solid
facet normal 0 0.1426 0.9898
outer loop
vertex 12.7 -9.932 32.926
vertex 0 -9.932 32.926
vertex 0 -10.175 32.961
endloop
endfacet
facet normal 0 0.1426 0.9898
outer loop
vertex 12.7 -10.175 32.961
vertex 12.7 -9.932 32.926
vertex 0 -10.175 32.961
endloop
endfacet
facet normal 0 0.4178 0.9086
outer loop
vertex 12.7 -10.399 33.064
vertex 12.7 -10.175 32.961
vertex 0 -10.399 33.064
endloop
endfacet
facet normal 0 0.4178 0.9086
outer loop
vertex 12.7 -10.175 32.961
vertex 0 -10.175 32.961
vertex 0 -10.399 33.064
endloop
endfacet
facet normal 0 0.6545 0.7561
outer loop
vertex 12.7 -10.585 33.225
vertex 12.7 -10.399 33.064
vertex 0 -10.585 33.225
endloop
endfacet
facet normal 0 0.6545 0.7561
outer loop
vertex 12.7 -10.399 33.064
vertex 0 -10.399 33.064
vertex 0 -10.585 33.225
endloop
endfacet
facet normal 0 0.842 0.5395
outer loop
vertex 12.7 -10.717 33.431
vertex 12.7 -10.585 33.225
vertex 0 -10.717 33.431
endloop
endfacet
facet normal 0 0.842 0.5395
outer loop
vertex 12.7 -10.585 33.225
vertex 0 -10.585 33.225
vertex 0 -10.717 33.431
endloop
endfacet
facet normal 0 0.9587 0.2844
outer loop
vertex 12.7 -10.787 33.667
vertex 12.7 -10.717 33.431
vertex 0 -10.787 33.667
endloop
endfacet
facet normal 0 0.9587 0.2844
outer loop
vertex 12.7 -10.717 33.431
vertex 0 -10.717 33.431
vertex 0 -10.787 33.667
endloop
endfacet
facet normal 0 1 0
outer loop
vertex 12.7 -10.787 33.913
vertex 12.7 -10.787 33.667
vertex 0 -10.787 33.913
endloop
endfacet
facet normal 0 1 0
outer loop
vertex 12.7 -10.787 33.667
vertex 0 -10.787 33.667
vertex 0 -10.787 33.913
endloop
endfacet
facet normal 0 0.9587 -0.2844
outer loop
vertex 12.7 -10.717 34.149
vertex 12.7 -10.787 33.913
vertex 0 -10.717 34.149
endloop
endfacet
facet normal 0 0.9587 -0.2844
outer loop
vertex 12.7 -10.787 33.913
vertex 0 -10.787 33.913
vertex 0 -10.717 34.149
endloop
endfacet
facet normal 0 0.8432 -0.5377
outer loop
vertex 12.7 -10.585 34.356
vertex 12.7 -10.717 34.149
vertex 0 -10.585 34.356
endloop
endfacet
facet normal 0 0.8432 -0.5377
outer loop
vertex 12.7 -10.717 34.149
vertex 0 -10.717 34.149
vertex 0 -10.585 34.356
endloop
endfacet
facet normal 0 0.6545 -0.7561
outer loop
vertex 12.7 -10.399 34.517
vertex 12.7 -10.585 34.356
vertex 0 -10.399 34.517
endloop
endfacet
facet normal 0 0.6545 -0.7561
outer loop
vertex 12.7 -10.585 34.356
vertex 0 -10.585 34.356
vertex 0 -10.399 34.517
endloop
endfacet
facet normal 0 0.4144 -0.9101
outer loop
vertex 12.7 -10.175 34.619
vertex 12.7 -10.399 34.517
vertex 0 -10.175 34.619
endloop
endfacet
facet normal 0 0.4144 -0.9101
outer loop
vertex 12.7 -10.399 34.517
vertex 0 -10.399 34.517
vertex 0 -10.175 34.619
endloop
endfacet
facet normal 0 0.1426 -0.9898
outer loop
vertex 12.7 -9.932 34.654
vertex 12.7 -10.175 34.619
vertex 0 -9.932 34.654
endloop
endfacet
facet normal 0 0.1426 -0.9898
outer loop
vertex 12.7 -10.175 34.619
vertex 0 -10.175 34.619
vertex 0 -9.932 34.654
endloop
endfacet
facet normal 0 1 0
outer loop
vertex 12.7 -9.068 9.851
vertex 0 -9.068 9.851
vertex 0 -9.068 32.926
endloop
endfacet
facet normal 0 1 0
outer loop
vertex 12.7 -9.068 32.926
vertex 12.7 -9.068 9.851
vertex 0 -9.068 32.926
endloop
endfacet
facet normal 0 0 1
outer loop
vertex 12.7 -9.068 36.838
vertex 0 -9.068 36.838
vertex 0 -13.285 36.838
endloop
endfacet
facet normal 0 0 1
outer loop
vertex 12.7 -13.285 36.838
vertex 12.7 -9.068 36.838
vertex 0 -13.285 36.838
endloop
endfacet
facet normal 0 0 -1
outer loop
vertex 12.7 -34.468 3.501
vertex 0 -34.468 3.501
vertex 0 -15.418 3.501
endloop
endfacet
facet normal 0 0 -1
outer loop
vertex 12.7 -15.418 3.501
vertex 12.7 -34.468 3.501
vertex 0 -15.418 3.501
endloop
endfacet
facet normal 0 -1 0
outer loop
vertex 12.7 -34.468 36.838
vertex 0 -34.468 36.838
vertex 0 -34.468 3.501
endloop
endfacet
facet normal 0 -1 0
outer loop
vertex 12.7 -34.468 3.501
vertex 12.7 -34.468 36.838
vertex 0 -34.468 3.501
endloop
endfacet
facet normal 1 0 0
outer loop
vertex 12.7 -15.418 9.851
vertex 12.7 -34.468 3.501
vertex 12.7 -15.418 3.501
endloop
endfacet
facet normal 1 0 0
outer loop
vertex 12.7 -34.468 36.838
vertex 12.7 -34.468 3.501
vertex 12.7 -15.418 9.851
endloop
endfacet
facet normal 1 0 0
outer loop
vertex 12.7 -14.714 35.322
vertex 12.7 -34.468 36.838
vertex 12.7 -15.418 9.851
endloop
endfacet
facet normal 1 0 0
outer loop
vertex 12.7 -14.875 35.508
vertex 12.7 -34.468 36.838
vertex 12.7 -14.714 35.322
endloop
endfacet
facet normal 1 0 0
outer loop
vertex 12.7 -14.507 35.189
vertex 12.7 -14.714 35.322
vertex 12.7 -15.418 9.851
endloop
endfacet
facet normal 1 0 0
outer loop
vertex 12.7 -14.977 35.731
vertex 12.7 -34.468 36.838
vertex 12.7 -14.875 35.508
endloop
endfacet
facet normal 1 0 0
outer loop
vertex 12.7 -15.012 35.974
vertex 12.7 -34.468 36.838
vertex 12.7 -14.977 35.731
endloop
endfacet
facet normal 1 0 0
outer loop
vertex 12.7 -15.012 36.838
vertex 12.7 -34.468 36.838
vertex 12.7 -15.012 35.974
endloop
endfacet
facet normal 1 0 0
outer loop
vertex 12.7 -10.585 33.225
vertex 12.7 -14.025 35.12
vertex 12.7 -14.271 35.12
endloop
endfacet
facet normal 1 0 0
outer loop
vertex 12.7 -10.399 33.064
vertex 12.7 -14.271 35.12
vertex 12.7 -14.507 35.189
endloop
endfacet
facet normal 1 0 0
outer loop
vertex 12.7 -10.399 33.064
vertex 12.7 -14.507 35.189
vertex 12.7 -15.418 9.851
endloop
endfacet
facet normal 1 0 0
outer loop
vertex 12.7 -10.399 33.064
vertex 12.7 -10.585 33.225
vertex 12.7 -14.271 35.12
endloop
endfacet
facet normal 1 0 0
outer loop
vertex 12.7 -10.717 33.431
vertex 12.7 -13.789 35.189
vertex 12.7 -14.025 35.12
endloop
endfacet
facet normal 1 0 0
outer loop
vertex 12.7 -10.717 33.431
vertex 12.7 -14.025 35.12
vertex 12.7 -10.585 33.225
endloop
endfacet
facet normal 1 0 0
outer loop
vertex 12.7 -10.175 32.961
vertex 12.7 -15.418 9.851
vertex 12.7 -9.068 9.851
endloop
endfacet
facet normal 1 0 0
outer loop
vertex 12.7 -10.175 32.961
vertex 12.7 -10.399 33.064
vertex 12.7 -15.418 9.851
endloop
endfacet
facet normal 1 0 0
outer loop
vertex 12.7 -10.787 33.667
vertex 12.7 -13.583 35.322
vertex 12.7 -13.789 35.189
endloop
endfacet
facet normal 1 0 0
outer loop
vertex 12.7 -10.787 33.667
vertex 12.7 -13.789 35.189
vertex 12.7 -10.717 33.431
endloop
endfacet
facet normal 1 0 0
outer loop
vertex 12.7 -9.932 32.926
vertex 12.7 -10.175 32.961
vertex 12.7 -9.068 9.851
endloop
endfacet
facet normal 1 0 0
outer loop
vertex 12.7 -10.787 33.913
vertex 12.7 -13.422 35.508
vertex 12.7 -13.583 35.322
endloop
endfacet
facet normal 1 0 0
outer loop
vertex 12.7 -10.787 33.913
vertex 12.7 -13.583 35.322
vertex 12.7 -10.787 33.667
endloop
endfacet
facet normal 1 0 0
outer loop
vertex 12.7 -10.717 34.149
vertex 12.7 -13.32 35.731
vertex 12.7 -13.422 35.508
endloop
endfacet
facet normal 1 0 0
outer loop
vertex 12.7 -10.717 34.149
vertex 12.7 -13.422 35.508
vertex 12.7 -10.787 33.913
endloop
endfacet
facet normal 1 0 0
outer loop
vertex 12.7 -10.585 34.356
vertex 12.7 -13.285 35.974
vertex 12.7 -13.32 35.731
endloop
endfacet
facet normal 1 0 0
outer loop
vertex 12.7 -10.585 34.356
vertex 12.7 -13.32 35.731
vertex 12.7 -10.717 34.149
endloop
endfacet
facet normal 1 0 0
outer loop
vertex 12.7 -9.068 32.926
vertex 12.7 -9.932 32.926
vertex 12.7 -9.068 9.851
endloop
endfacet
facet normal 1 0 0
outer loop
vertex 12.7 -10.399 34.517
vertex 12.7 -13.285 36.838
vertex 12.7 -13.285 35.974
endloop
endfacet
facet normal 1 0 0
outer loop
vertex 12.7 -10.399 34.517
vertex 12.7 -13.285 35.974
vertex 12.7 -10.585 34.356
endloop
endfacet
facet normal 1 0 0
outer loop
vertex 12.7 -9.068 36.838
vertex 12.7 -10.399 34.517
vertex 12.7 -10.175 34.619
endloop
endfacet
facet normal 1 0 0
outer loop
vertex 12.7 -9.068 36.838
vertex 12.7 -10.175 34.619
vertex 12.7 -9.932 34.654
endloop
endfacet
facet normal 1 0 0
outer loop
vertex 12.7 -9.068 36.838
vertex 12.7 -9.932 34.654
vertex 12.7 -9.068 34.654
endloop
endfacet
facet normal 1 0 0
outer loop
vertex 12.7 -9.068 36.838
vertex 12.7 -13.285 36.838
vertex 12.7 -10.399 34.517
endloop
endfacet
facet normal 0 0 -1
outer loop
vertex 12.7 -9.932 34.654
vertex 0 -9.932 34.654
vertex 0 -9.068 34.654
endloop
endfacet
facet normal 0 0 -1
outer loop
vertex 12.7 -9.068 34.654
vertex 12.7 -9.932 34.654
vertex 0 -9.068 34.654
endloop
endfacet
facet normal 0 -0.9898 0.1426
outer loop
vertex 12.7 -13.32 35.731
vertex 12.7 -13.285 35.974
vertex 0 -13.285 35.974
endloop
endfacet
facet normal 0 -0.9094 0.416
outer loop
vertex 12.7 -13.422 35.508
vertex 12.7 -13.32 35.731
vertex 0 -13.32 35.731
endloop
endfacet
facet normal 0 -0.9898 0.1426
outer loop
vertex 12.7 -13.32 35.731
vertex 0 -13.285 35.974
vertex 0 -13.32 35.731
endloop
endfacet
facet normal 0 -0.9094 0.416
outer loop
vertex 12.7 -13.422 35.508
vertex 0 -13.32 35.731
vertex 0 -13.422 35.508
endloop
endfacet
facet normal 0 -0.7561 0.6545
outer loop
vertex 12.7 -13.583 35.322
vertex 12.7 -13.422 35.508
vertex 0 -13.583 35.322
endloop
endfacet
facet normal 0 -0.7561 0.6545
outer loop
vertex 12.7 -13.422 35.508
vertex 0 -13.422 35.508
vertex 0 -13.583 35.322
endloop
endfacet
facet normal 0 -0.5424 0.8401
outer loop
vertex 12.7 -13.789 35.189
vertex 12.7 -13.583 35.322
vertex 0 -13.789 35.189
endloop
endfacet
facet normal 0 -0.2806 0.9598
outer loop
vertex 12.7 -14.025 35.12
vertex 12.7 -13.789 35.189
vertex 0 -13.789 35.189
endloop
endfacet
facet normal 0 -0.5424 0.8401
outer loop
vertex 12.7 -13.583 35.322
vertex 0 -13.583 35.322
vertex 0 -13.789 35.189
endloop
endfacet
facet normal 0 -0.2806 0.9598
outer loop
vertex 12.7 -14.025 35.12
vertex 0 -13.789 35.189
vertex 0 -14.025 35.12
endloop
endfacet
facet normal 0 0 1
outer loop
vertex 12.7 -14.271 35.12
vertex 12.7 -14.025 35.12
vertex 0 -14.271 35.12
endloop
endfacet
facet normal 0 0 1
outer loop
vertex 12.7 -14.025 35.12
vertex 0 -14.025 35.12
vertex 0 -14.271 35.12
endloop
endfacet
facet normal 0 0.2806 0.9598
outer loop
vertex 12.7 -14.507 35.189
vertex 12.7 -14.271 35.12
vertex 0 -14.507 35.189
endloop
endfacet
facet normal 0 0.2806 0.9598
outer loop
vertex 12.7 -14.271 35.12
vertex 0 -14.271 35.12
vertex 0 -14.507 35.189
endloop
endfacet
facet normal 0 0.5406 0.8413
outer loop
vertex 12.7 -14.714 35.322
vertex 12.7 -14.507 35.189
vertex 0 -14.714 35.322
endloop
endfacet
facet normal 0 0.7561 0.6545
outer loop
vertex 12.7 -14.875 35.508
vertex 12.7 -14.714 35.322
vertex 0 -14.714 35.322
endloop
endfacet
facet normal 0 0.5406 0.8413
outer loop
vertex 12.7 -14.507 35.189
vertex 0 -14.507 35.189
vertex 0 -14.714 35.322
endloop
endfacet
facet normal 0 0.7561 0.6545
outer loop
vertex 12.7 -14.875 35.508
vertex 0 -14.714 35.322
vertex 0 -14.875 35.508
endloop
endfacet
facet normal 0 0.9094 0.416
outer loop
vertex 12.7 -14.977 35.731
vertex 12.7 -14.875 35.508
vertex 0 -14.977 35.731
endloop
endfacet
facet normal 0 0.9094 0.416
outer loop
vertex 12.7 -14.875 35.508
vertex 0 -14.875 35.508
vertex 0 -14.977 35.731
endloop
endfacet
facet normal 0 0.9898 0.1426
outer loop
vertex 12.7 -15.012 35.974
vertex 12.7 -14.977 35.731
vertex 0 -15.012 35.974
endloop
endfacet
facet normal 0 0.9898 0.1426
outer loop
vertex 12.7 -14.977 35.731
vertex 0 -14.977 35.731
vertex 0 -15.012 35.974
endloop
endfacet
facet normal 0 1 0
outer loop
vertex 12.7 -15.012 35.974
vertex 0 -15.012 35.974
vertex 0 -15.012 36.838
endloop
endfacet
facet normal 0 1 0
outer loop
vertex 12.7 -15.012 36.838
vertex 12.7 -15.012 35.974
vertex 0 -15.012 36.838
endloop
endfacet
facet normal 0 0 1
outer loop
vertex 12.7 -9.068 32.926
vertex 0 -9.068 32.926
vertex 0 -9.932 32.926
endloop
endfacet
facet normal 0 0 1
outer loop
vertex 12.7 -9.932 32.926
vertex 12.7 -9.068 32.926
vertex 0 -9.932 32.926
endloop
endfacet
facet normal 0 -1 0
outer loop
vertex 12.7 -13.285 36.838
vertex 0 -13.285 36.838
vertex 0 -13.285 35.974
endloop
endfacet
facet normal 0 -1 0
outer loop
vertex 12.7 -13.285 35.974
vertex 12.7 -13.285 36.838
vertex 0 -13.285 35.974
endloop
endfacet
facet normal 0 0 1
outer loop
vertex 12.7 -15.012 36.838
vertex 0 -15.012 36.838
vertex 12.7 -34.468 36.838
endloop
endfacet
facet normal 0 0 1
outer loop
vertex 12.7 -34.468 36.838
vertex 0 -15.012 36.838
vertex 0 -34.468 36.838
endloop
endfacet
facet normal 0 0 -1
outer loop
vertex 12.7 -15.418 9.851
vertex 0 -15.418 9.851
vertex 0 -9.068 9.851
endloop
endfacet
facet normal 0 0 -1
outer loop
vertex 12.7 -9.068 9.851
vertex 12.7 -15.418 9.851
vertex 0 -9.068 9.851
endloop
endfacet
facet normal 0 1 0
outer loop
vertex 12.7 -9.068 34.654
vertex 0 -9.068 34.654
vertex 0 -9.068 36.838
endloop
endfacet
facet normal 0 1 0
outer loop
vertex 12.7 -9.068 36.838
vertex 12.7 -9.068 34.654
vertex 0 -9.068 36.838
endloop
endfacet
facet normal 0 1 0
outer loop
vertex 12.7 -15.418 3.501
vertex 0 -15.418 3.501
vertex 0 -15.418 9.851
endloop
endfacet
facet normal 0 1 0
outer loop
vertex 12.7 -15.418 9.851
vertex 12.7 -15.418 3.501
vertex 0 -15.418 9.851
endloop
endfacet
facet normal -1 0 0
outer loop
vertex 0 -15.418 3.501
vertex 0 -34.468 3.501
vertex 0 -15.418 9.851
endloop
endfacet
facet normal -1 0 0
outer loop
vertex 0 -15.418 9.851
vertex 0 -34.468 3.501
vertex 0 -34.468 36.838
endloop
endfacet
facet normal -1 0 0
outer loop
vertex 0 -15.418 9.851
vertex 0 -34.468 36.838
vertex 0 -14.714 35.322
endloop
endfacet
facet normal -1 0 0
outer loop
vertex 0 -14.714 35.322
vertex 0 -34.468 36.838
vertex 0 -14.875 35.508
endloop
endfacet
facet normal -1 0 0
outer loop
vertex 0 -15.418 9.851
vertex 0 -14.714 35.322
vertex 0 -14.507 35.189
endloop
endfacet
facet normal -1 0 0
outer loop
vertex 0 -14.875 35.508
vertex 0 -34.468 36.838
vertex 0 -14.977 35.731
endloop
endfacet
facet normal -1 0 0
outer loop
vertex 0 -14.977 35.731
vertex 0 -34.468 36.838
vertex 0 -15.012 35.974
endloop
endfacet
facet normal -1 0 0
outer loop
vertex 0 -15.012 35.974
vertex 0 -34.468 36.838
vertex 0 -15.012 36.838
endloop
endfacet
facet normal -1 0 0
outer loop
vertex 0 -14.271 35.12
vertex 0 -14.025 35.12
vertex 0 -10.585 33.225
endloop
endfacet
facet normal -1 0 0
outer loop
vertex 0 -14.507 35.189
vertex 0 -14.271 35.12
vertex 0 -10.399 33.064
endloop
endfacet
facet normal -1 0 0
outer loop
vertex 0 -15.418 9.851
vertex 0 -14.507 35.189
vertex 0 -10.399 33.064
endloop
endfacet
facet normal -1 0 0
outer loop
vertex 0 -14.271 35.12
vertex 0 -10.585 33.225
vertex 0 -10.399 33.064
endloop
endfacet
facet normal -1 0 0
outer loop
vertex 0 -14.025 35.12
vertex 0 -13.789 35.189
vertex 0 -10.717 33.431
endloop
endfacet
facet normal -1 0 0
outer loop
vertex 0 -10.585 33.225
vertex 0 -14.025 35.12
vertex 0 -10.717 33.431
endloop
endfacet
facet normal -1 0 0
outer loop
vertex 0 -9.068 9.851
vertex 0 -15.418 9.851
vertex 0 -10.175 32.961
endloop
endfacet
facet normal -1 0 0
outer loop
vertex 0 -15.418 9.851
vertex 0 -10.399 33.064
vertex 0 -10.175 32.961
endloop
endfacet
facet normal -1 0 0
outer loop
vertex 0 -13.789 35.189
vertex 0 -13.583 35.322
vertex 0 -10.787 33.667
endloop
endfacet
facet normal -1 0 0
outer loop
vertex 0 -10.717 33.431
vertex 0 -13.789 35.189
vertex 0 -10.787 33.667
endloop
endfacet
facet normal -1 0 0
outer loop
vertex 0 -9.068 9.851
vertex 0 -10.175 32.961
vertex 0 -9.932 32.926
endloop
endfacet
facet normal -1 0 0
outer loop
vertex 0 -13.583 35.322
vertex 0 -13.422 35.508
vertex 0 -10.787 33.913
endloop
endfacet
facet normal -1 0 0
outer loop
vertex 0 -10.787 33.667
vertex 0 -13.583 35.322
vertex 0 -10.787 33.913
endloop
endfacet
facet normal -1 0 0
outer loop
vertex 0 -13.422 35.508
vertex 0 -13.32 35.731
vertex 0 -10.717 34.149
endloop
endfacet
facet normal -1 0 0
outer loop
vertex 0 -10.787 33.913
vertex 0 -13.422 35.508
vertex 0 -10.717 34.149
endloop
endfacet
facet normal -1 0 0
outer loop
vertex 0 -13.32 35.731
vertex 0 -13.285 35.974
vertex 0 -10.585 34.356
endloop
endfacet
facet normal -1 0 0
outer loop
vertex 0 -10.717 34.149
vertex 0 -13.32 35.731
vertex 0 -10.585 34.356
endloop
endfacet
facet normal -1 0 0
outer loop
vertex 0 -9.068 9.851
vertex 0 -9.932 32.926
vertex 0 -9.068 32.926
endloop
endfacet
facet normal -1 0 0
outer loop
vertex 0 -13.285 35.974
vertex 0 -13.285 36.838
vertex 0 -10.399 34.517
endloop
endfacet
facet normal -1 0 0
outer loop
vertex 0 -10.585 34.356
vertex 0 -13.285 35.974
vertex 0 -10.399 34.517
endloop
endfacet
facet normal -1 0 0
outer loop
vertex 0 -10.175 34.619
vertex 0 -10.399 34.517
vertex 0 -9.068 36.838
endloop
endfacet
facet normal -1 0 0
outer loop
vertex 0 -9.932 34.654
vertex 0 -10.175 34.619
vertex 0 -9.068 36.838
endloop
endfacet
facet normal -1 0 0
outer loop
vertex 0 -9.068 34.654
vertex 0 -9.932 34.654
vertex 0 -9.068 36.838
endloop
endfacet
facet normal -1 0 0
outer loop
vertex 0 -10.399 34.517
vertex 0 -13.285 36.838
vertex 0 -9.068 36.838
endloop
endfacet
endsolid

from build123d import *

# Parameters (mm, degrees)
F1_DEPTH = 12.7


with BuildPart() as f1:
    # F0 (on Right) → F1 (new body)
    with BuildSketch(Plane.YZ):
        with BuildLine():
            Line((-15.011845, 36.838097), (-34.468245, 36.838097))
            Line((-34.468245, 36.838097), (-34.468245, 3.500597))
            Line((-34.468245, 3.500597), (-15.418245, 3.500597))
            Line((-15.418245, 3.500597), (-15.418245, 9.850597))
            Line((-15.418245, 9.850597), (-9.068245, 9.850597))
            Line((-9.068245, 9.850597), (-9.068245, 32.926497))
            Line((-9.068245, 32.926497), (-9.931845, 32.926497))
            ThreePointArc((-9.931845, 32.926497), (-10.795445, 33.790097), (-9.931845, 34.653697))
            Line((-9.931845, 34.653697), (-9.068245, 34.653697))
            Line((-9.068245, 34.653697), (-9.068245, 36.838097))
            Line((-9.068245, 36.838097), (-13.284645, 36.838097))
            Line((-13.284645, 36.838097), (-13.284645, 35.974497))
            ThreePointArc((-13.284645, 35.974497), (-14.148245, 35.110897), (-15.011845, 35.974497))
            Line((-15.011845, 35.974497), (-15.011845, 36.838097))
        make_face()
    extrude(amount=F1_DEPTH)


solid = f1.part
